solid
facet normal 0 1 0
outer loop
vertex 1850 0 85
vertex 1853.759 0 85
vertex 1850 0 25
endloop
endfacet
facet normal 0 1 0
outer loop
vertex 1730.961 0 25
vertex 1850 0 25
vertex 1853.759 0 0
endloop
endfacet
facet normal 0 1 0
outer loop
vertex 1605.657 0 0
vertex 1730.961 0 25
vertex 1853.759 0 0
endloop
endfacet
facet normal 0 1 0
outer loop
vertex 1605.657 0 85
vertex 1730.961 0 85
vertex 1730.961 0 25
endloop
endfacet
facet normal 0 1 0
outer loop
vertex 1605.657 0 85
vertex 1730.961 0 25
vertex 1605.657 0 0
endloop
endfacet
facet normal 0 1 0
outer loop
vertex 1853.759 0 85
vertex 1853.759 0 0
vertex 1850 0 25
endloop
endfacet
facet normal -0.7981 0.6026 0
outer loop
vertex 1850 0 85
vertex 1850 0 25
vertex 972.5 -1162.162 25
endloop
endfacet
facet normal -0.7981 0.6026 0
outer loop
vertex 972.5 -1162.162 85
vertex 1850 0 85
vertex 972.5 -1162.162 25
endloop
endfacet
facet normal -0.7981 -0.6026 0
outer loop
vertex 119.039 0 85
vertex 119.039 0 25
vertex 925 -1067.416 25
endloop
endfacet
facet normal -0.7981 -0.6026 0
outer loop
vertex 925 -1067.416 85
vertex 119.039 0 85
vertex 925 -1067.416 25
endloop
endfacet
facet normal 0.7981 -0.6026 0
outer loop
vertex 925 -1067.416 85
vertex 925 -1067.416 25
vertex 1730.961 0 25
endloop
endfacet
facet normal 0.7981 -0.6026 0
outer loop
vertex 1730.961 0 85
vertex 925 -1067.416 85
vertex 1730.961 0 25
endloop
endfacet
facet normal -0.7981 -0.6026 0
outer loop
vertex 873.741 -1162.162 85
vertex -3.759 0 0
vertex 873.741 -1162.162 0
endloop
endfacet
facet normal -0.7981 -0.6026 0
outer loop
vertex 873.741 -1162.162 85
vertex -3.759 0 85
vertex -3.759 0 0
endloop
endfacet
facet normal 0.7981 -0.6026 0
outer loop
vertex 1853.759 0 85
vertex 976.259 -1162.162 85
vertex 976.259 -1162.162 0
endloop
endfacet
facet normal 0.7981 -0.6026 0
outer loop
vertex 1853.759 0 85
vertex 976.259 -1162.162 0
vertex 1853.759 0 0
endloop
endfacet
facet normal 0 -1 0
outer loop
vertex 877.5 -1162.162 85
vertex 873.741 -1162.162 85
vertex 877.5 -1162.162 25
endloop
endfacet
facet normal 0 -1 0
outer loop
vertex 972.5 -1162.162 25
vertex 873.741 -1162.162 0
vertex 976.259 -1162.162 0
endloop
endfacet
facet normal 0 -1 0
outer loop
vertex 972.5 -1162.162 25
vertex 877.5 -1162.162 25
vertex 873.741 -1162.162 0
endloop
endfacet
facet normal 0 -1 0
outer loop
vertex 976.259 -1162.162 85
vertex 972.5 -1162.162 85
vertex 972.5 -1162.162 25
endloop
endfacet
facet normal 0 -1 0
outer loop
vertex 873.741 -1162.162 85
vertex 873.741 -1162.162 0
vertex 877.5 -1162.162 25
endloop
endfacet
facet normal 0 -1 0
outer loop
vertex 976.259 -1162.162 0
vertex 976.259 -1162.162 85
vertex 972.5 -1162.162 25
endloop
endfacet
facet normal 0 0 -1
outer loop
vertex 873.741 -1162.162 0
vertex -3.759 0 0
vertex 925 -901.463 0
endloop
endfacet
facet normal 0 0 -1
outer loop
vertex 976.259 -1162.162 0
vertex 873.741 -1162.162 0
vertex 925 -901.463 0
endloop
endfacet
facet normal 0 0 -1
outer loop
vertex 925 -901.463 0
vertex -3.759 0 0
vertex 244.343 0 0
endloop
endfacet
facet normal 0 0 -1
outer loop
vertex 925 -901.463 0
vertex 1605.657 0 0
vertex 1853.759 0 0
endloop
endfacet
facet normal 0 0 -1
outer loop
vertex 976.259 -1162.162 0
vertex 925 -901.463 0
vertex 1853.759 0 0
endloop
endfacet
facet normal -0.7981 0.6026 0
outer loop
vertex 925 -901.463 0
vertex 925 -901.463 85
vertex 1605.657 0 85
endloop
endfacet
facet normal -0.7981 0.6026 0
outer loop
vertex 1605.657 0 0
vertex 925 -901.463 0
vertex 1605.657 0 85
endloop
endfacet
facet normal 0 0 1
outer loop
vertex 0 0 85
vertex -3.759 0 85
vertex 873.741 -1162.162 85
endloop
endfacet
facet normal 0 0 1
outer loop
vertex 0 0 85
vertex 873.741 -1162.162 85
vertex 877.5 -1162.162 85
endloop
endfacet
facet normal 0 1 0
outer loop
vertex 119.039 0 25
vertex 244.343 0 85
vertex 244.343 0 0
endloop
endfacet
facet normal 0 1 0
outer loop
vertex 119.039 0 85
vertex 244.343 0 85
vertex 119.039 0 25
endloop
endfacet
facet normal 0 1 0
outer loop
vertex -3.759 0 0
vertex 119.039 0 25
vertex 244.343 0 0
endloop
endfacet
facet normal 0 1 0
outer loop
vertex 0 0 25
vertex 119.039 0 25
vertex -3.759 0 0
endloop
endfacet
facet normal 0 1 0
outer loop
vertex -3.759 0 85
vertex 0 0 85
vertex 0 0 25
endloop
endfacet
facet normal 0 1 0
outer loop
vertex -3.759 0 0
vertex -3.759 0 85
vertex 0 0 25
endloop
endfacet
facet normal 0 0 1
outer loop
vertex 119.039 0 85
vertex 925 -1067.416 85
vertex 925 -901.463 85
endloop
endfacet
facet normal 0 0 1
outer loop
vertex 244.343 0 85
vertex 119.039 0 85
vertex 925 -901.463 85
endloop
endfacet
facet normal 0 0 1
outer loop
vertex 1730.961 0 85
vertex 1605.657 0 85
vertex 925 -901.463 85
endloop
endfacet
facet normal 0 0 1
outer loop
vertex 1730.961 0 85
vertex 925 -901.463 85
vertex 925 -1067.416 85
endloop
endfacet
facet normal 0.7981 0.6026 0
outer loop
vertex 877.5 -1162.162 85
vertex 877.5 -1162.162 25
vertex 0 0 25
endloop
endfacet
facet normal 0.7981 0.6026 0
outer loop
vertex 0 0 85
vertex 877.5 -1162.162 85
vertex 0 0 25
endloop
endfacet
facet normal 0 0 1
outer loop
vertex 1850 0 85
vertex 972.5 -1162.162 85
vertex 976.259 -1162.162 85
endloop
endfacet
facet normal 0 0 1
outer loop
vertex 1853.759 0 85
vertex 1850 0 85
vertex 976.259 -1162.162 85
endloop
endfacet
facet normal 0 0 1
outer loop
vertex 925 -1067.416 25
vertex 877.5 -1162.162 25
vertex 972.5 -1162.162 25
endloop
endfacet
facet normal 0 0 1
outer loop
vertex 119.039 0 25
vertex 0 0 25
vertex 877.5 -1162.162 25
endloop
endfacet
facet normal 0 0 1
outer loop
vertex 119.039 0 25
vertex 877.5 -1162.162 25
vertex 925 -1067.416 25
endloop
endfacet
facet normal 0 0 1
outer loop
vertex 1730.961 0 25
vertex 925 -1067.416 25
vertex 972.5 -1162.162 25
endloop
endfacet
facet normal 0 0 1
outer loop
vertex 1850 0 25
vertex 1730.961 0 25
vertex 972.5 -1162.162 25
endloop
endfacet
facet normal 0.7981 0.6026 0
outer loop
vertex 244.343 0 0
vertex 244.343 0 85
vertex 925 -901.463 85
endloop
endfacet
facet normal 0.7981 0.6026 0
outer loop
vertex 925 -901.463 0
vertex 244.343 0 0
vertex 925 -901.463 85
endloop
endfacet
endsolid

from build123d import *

# Parameters (mm, degrees)
F1_DEPTH      = 25
F3_DEPTH      = 60
F5_DEPTH      = 60
F5_DEPTH_BACK = 25
F7_DEPTH      = 85.001


with BuildPart() as f1:
    # F0 (on Top) → F1 (new body)
    with BuildSketch(Plane.XY):
        Polygon((1850, 0), (0, 0), (877.5, -1162.1623567633), (972.5, -1162.1623567633), align=None)
    extrude(amount=F1_DEPTH)

    # F2 (on face) → F3 (join)
    with BuildSketch(Plane.XY.offset(25)):
        Polygon((119.0389274289, 0), (925, -1067.4160906651), (1730.9610725711, 0), align=None)
    extrude(amount=F3_DEPTH)

    # F4 (on face) → F5 (join, two sides)
    with BuildSketch(Plane.XY.offset(25)) as f5_sk:
        Polygon((-3.7591240241, 0), (873.7408759759, -1162.1623567633), (877.5, -1162.1623567633), (0, 0), align=None)
        Polygon((1850, 0), (972.5, -1162.1623567633), (976.2591240241, -1162.1623567633), (1853.7591240241, 0), align=None)
    extrude(amount=F5_DEPTH)
    extrude(f5_sk.sketch, amount=-F5_DEPTH_BACK)

    # F6 (on face) → F7 (cut, through all)
    with BuildSketch(Plane.XY.offset(85)):
        Polygon((244.3430615646, 0), (925, -901.4631016744), (1605.6569384354, 0), align=None)
    extrude(amount=-F7_DEPTH, mode=Mode.SUBTRACT)


solid = f1.part
